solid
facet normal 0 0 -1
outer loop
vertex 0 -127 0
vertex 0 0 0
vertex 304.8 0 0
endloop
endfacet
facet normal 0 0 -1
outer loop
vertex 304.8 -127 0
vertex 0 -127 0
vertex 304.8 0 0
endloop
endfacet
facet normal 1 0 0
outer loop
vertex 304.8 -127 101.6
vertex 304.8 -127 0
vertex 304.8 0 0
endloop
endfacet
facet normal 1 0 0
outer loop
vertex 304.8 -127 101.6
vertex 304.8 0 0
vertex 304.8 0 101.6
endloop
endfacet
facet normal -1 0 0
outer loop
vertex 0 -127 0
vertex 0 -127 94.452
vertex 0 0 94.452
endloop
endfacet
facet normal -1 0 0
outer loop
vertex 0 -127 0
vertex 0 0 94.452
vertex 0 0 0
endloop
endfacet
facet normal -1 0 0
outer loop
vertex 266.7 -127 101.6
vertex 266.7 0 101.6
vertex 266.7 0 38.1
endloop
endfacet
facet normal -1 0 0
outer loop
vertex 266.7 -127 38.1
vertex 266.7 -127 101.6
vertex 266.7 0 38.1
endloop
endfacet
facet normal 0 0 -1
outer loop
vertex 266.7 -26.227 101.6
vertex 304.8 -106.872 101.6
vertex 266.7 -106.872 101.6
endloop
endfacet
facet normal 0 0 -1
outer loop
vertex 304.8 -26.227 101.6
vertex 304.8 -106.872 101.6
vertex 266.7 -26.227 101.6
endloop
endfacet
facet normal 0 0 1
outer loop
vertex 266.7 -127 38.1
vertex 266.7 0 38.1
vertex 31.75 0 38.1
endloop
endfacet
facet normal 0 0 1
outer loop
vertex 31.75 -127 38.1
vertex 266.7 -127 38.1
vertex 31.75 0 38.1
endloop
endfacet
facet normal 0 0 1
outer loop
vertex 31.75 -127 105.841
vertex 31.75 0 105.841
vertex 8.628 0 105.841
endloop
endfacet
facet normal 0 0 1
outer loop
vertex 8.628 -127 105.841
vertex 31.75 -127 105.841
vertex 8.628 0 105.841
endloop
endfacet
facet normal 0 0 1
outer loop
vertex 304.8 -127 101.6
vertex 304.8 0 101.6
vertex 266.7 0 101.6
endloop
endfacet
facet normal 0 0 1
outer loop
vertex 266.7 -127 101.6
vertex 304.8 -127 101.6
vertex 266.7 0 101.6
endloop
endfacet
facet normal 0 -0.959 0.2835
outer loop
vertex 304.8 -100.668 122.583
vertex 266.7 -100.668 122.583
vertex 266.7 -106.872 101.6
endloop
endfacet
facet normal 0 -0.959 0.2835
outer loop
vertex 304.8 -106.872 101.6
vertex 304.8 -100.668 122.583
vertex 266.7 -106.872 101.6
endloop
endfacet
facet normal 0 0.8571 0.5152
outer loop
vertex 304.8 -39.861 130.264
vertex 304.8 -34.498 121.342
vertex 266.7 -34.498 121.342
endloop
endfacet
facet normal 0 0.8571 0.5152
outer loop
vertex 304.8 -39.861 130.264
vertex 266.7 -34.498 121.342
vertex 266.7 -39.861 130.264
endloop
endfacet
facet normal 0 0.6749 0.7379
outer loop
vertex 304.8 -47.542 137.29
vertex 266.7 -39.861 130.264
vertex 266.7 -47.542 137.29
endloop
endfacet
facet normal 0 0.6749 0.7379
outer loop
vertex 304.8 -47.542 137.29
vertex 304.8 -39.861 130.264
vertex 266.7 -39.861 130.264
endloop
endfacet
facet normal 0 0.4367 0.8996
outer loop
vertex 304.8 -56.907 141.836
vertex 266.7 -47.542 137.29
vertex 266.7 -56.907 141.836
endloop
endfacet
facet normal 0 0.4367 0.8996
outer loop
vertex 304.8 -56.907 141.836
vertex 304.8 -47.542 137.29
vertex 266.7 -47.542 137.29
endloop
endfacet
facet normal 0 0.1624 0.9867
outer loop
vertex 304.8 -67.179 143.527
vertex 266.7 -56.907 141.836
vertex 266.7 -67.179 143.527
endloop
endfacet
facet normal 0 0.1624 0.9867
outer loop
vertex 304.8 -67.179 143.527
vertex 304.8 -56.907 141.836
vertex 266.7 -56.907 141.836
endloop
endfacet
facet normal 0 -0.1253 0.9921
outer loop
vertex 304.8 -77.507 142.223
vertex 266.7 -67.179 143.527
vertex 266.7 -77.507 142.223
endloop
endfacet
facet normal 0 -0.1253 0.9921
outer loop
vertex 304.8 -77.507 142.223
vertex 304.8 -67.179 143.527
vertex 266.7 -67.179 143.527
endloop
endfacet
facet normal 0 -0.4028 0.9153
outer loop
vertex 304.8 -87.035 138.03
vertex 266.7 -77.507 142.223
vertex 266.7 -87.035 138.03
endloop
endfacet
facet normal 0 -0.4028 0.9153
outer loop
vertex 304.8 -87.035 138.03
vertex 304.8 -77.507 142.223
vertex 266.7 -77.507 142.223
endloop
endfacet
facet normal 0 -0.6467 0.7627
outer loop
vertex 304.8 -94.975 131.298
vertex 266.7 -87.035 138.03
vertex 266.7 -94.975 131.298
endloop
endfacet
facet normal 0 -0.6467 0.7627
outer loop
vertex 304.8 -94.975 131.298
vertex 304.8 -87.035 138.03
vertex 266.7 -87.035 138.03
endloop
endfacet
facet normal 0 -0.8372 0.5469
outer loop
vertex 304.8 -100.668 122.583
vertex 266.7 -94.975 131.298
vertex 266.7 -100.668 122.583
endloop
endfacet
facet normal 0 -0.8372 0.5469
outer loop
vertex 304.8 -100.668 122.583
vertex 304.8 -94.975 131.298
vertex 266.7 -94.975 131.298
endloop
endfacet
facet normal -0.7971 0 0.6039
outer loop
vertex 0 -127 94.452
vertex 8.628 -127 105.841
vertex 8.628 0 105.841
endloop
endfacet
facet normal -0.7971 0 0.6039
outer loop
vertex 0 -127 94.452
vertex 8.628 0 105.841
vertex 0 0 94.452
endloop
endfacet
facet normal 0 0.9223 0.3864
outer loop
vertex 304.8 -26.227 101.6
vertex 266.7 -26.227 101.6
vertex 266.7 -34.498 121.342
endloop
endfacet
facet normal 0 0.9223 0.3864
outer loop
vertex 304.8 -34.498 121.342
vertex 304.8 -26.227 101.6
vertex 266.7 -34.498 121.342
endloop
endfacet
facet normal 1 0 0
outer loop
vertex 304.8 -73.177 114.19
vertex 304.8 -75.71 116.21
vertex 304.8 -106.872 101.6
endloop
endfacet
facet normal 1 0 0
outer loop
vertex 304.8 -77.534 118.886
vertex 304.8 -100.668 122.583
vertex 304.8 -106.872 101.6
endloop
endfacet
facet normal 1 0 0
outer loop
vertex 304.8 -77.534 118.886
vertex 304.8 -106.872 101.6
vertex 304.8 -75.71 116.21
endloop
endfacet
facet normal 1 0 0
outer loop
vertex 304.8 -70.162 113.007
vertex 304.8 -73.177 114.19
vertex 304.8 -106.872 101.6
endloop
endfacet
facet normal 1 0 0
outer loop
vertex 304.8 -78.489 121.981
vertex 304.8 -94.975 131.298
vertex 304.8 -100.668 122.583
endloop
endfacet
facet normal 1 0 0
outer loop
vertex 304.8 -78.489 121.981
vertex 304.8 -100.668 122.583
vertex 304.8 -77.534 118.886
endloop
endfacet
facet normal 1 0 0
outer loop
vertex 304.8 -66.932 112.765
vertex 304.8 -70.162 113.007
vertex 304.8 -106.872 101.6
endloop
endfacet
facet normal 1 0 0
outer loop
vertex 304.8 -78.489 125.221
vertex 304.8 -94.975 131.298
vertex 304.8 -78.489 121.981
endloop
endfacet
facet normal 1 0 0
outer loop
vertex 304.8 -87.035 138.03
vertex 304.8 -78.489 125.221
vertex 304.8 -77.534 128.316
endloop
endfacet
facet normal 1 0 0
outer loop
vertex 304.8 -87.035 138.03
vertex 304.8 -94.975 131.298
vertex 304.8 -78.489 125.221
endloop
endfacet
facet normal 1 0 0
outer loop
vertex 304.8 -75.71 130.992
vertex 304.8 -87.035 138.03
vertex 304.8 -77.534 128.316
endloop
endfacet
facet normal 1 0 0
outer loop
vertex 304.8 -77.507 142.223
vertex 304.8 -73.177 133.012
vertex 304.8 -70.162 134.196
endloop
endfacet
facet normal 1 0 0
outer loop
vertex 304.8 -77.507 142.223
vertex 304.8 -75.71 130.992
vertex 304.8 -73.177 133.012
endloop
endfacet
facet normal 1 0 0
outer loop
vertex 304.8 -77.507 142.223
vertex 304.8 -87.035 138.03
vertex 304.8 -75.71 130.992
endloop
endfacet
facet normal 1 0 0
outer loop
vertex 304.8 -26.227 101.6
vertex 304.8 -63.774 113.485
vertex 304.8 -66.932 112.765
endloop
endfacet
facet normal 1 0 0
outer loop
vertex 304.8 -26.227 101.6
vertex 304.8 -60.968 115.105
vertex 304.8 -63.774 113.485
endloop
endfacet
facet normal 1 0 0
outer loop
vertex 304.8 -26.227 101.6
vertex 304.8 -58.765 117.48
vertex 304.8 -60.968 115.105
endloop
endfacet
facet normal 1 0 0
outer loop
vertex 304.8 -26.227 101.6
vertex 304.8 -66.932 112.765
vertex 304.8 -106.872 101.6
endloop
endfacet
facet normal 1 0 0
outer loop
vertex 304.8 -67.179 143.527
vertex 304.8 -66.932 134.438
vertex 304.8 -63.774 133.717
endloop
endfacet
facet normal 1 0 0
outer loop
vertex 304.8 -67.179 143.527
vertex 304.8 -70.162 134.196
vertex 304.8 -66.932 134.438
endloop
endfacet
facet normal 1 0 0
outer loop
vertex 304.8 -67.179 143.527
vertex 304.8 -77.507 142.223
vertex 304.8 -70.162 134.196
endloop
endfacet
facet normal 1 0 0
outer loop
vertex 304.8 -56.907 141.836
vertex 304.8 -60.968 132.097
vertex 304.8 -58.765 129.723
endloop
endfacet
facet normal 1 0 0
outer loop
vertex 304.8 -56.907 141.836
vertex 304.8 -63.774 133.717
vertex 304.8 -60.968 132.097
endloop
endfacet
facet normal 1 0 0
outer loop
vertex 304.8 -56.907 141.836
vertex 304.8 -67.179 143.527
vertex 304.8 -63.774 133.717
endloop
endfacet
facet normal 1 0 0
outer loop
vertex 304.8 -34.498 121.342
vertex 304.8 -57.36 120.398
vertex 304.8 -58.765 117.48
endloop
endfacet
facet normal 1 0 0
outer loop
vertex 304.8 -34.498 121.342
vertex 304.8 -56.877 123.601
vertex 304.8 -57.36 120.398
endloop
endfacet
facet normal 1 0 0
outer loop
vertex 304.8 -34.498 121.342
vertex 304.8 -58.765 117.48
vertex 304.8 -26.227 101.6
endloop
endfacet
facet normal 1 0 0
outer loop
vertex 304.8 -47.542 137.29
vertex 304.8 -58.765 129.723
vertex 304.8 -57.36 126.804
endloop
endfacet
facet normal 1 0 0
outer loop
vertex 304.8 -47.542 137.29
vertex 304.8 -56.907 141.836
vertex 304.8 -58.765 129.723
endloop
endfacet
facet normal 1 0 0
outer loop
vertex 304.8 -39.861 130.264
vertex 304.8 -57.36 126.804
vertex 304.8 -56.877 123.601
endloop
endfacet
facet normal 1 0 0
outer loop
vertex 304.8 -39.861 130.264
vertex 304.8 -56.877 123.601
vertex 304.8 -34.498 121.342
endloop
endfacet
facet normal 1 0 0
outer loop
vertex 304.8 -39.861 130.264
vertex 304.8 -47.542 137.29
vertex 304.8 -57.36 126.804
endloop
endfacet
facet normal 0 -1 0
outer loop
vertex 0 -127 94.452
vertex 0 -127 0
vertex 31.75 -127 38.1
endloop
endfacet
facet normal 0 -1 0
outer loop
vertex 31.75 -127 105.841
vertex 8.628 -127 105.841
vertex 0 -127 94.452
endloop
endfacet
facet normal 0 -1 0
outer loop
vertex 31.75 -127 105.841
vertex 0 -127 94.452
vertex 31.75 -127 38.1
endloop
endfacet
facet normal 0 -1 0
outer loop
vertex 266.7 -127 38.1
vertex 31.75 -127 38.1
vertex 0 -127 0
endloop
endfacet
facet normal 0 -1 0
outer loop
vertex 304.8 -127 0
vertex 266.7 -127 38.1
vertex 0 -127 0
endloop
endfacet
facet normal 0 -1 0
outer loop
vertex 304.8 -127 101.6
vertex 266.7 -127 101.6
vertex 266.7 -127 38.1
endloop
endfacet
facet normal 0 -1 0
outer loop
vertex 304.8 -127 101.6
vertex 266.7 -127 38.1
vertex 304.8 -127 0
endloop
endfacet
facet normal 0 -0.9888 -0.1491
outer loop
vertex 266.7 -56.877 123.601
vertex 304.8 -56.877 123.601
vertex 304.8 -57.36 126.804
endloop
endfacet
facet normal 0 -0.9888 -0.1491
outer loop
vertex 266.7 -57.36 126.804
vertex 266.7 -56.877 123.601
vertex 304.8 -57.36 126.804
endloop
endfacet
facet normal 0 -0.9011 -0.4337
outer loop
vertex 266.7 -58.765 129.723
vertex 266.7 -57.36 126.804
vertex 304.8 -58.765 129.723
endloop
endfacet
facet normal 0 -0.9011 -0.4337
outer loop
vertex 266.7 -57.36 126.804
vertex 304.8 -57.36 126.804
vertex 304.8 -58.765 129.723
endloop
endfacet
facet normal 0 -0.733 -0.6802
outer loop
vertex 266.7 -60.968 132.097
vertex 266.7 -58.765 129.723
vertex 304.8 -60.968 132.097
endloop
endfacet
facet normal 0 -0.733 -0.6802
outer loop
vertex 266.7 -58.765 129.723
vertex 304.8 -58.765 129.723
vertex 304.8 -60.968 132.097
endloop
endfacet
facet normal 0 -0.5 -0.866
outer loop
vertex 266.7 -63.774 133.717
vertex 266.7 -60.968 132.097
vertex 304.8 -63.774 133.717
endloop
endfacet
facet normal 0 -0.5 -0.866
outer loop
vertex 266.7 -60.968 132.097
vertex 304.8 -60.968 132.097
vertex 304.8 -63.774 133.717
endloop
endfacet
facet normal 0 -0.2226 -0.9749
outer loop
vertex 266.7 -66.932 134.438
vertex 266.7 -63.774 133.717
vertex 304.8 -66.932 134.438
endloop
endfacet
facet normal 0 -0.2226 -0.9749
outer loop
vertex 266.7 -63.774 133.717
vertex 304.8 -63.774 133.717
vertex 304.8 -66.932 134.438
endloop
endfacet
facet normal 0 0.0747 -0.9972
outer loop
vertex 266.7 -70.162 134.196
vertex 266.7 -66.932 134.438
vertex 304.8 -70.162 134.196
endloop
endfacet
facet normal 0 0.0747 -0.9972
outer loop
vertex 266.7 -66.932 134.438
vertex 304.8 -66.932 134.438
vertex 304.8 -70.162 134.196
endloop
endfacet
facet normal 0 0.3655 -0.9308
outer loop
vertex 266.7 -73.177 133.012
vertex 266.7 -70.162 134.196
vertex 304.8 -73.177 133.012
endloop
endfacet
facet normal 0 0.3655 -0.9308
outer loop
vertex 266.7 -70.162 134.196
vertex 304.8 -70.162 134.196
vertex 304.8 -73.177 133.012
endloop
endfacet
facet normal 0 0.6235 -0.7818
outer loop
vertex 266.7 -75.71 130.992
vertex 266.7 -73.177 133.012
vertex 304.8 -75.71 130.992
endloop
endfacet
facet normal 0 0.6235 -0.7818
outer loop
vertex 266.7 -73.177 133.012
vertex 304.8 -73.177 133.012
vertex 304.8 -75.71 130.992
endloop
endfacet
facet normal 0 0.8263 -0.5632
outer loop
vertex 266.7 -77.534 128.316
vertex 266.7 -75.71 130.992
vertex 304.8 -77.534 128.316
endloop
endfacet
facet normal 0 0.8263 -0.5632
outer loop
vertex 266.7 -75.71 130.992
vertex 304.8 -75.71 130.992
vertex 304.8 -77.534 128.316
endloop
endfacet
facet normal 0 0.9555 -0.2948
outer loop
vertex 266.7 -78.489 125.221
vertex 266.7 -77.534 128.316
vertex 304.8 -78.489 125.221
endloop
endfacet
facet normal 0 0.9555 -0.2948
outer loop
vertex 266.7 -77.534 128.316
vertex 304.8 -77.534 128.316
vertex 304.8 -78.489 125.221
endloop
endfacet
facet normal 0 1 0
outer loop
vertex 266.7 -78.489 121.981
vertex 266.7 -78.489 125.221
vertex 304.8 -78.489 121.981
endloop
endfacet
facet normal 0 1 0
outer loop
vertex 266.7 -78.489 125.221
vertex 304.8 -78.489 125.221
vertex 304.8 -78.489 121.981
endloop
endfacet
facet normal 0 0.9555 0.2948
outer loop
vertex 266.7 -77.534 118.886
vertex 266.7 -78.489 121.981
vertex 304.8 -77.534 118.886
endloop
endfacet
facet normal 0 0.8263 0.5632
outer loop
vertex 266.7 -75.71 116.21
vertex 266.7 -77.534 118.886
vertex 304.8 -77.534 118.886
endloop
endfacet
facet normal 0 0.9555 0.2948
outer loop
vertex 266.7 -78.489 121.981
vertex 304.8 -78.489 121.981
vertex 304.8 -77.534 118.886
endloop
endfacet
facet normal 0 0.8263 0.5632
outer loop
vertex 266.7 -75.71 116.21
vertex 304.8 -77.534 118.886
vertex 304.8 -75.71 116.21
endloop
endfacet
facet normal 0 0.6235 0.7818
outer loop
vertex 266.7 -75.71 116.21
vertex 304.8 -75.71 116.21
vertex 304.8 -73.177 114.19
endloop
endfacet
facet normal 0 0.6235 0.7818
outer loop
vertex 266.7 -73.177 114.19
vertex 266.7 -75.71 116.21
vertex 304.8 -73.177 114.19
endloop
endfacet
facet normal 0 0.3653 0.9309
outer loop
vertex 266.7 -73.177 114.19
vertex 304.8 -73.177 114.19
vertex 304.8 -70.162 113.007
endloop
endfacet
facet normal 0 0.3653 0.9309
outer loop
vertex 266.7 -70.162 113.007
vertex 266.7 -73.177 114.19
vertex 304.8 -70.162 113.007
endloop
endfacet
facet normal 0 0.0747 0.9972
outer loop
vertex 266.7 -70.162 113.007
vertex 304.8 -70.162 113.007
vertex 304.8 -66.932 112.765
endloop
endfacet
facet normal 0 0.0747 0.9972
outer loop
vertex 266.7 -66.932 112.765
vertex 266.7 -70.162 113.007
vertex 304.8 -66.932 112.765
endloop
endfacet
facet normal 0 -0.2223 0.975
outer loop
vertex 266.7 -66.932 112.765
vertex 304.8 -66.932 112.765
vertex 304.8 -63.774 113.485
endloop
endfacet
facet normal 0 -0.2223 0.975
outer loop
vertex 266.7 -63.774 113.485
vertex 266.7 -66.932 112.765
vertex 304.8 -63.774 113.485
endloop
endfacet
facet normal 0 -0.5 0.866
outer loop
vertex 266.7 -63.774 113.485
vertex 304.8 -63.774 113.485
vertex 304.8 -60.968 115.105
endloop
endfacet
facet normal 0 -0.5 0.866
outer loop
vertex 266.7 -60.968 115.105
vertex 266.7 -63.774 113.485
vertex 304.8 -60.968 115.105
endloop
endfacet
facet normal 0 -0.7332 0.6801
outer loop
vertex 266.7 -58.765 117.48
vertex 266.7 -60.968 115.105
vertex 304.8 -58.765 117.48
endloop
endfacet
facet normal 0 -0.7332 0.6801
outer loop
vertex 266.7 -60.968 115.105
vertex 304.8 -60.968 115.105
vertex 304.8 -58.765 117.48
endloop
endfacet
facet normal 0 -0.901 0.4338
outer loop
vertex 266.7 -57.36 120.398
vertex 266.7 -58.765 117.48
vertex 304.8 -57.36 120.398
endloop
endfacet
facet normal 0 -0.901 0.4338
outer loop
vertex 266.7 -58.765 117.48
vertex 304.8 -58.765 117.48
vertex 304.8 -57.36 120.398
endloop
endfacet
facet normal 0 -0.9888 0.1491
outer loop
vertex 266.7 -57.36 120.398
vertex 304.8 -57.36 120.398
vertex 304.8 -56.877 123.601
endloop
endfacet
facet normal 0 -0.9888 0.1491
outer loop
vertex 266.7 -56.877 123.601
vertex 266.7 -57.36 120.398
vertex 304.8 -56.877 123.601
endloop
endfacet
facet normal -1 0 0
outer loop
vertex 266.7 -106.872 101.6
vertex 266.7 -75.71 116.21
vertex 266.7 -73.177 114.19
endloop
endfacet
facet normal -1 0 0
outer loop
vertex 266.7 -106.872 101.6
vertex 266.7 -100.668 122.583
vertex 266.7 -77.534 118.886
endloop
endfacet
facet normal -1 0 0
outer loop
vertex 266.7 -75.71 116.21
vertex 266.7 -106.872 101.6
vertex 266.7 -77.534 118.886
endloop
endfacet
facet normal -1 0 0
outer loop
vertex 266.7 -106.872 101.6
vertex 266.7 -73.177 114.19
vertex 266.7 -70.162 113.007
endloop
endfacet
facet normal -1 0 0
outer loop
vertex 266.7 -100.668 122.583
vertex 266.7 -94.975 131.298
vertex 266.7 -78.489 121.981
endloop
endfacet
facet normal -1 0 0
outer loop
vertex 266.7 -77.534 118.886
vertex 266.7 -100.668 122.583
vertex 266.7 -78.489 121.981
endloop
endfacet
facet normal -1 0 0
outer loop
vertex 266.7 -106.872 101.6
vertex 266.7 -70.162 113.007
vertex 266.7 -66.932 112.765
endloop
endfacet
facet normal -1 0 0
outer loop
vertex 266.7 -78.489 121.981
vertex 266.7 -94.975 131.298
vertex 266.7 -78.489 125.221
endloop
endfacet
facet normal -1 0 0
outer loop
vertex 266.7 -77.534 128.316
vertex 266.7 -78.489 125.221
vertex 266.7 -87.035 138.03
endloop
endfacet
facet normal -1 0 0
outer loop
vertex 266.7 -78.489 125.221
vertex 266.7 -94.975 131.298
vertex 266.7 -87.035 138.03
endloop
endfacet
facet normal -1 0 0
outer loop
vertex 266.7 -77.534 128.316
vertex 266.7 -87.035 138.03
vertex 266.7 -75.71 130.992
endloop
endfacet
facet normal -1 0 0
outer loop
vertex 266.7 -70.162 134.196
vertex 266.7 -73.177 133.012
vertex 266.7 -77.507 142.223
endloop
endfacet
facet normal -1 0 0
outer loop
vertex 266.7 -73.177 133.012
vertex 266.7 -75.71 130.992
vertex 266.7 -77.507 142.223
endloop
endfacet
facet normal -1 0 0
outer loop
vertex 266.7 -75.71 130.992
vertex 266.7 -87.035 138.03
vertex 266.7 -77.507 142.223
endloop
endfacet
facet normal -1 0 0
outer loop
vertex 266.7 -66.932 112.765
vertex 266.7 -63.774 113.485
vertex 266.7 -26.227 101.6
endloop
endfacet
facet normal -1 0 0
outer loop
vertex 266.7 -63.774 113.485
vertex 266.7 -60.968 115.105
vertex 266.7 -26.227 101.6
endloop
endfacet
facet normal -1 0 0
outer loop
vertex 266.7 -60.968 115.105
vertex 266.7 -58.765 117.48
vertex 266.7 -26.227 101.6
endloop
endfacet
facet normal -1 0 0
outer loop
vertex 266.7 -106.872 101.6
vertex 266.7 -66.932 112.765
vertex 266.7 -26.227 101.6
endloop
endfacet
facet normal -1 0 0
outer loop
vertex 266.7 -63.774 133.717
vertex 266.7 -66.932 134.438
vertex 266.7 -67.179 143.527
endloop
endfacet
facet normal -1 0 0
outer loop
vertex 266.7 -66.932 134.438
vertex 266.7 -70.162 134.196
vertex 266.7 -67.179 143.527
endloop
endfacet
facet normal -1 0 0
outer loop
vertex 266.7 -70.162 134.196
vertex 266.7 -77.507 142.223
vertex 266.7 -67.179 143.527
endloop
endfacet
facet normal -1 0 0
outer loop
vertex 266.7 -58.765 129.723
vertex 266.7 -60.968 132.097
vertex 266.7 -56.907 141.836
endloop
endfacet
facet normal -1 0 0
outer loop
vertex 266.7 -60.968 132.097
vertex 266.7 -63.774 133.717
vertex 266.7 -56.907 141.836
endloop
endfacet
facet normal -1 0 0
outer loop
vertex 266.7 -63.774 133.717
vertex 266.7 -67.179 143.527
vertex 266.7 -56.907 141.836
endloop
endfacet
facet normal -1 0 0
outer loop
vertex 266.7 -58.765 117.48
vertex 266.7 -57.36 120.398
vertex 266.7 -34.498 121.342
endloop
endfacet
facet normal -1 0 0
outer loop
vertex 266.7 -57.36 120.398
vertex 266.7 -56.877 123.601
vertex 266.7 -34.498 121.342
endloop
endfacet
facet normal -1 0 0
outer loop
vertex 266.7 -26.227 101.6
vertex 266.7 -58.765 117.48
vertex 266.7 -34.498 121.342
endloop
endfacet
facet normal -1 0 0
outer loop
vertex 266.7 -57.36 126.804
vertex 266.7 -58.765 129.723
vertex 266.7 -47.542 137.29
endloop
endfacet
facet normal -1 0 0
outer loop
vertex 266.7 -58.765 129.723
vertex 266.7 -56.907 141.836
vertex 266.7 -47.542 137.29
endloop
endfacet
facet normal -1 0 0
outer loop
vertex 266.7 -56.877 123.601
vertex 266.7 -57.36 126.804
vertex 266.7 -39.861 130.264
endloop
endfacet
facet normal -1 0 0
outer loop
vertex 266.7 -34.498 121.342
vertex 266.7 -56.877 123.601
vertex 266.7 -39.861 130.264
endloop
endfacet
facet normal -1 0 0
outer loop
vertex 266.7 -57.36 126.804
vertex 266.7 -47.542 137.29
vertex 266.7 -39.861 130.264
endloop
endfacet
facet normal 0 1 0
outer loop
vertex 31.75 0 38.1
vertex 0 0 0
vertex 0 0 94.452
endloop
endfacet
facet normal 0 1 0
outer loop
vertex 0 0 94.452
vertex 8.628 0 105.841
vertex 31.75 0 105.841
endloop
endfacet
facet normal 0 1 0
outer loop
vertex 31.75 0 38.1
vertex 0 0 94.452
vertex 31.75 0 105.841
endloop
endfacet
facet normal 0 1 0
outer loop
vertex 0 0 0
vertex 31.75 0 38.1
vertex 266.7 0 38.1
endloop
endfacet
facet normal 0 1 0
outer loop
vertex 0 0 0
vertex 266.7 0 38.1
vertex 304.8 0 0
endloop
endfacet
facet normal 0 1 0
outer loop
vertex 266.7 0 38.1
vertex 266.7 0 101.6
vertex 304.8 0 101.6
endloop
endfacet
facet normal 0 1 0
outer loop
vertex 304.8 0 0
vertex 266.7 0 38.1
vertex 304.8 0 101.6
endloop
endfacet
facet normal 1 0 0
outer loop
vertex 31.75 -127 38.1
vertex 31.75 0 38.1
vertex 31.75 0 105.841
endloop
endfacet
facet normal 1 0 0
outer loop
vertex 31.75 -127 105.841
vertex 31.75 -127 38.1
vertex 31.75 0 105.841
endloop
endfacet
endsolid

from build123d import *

# Parameters (mm, degrees)
F1_DEPTH = 127
F2_R     = 10.866884
F3_DEPTH = 38.1


with BuildPart() as f1:
    # F0 (on Front) → F1 (new body)
    with BuildSketch(Plane.XZ):
        Polygon((0, 94.452262), (0, 0), (304.8, 0), (304.8, 101.6), (266.7, 101.6), (266.7, 38.1), (31.75, 38.1), (31.75, 105.840716), (8.627616, 105.840716), align=None)
    extrude(amount=F1_DEPTH)


with BuildPart() as f3:
    # F2 (on face) → F3 (new body)
    with BuildSketch(Plane.YZ.offset(304.8)):
        with BuildLine():
            Line((-100.668401, 122.582532), (-106.871866, 101.6))
            Line((-106.871866, 101.6), (-26.226833, 101.6))
            Line((-26.226833, 101.6), (-34.498122, 121.341839))
            ThreePointArc((-34.498122, 121.341839), (-67.178913, 143.527437), (-100.668401, 122.582532))
        make_face()
        with Locations((-67.743756, 123.601116)):
            Circle(F2_R, mode=Mode.SUBTRACT)
    extrude(amount=-F3_DEPTH)


solid = Compound([f1.part, f3.part])
